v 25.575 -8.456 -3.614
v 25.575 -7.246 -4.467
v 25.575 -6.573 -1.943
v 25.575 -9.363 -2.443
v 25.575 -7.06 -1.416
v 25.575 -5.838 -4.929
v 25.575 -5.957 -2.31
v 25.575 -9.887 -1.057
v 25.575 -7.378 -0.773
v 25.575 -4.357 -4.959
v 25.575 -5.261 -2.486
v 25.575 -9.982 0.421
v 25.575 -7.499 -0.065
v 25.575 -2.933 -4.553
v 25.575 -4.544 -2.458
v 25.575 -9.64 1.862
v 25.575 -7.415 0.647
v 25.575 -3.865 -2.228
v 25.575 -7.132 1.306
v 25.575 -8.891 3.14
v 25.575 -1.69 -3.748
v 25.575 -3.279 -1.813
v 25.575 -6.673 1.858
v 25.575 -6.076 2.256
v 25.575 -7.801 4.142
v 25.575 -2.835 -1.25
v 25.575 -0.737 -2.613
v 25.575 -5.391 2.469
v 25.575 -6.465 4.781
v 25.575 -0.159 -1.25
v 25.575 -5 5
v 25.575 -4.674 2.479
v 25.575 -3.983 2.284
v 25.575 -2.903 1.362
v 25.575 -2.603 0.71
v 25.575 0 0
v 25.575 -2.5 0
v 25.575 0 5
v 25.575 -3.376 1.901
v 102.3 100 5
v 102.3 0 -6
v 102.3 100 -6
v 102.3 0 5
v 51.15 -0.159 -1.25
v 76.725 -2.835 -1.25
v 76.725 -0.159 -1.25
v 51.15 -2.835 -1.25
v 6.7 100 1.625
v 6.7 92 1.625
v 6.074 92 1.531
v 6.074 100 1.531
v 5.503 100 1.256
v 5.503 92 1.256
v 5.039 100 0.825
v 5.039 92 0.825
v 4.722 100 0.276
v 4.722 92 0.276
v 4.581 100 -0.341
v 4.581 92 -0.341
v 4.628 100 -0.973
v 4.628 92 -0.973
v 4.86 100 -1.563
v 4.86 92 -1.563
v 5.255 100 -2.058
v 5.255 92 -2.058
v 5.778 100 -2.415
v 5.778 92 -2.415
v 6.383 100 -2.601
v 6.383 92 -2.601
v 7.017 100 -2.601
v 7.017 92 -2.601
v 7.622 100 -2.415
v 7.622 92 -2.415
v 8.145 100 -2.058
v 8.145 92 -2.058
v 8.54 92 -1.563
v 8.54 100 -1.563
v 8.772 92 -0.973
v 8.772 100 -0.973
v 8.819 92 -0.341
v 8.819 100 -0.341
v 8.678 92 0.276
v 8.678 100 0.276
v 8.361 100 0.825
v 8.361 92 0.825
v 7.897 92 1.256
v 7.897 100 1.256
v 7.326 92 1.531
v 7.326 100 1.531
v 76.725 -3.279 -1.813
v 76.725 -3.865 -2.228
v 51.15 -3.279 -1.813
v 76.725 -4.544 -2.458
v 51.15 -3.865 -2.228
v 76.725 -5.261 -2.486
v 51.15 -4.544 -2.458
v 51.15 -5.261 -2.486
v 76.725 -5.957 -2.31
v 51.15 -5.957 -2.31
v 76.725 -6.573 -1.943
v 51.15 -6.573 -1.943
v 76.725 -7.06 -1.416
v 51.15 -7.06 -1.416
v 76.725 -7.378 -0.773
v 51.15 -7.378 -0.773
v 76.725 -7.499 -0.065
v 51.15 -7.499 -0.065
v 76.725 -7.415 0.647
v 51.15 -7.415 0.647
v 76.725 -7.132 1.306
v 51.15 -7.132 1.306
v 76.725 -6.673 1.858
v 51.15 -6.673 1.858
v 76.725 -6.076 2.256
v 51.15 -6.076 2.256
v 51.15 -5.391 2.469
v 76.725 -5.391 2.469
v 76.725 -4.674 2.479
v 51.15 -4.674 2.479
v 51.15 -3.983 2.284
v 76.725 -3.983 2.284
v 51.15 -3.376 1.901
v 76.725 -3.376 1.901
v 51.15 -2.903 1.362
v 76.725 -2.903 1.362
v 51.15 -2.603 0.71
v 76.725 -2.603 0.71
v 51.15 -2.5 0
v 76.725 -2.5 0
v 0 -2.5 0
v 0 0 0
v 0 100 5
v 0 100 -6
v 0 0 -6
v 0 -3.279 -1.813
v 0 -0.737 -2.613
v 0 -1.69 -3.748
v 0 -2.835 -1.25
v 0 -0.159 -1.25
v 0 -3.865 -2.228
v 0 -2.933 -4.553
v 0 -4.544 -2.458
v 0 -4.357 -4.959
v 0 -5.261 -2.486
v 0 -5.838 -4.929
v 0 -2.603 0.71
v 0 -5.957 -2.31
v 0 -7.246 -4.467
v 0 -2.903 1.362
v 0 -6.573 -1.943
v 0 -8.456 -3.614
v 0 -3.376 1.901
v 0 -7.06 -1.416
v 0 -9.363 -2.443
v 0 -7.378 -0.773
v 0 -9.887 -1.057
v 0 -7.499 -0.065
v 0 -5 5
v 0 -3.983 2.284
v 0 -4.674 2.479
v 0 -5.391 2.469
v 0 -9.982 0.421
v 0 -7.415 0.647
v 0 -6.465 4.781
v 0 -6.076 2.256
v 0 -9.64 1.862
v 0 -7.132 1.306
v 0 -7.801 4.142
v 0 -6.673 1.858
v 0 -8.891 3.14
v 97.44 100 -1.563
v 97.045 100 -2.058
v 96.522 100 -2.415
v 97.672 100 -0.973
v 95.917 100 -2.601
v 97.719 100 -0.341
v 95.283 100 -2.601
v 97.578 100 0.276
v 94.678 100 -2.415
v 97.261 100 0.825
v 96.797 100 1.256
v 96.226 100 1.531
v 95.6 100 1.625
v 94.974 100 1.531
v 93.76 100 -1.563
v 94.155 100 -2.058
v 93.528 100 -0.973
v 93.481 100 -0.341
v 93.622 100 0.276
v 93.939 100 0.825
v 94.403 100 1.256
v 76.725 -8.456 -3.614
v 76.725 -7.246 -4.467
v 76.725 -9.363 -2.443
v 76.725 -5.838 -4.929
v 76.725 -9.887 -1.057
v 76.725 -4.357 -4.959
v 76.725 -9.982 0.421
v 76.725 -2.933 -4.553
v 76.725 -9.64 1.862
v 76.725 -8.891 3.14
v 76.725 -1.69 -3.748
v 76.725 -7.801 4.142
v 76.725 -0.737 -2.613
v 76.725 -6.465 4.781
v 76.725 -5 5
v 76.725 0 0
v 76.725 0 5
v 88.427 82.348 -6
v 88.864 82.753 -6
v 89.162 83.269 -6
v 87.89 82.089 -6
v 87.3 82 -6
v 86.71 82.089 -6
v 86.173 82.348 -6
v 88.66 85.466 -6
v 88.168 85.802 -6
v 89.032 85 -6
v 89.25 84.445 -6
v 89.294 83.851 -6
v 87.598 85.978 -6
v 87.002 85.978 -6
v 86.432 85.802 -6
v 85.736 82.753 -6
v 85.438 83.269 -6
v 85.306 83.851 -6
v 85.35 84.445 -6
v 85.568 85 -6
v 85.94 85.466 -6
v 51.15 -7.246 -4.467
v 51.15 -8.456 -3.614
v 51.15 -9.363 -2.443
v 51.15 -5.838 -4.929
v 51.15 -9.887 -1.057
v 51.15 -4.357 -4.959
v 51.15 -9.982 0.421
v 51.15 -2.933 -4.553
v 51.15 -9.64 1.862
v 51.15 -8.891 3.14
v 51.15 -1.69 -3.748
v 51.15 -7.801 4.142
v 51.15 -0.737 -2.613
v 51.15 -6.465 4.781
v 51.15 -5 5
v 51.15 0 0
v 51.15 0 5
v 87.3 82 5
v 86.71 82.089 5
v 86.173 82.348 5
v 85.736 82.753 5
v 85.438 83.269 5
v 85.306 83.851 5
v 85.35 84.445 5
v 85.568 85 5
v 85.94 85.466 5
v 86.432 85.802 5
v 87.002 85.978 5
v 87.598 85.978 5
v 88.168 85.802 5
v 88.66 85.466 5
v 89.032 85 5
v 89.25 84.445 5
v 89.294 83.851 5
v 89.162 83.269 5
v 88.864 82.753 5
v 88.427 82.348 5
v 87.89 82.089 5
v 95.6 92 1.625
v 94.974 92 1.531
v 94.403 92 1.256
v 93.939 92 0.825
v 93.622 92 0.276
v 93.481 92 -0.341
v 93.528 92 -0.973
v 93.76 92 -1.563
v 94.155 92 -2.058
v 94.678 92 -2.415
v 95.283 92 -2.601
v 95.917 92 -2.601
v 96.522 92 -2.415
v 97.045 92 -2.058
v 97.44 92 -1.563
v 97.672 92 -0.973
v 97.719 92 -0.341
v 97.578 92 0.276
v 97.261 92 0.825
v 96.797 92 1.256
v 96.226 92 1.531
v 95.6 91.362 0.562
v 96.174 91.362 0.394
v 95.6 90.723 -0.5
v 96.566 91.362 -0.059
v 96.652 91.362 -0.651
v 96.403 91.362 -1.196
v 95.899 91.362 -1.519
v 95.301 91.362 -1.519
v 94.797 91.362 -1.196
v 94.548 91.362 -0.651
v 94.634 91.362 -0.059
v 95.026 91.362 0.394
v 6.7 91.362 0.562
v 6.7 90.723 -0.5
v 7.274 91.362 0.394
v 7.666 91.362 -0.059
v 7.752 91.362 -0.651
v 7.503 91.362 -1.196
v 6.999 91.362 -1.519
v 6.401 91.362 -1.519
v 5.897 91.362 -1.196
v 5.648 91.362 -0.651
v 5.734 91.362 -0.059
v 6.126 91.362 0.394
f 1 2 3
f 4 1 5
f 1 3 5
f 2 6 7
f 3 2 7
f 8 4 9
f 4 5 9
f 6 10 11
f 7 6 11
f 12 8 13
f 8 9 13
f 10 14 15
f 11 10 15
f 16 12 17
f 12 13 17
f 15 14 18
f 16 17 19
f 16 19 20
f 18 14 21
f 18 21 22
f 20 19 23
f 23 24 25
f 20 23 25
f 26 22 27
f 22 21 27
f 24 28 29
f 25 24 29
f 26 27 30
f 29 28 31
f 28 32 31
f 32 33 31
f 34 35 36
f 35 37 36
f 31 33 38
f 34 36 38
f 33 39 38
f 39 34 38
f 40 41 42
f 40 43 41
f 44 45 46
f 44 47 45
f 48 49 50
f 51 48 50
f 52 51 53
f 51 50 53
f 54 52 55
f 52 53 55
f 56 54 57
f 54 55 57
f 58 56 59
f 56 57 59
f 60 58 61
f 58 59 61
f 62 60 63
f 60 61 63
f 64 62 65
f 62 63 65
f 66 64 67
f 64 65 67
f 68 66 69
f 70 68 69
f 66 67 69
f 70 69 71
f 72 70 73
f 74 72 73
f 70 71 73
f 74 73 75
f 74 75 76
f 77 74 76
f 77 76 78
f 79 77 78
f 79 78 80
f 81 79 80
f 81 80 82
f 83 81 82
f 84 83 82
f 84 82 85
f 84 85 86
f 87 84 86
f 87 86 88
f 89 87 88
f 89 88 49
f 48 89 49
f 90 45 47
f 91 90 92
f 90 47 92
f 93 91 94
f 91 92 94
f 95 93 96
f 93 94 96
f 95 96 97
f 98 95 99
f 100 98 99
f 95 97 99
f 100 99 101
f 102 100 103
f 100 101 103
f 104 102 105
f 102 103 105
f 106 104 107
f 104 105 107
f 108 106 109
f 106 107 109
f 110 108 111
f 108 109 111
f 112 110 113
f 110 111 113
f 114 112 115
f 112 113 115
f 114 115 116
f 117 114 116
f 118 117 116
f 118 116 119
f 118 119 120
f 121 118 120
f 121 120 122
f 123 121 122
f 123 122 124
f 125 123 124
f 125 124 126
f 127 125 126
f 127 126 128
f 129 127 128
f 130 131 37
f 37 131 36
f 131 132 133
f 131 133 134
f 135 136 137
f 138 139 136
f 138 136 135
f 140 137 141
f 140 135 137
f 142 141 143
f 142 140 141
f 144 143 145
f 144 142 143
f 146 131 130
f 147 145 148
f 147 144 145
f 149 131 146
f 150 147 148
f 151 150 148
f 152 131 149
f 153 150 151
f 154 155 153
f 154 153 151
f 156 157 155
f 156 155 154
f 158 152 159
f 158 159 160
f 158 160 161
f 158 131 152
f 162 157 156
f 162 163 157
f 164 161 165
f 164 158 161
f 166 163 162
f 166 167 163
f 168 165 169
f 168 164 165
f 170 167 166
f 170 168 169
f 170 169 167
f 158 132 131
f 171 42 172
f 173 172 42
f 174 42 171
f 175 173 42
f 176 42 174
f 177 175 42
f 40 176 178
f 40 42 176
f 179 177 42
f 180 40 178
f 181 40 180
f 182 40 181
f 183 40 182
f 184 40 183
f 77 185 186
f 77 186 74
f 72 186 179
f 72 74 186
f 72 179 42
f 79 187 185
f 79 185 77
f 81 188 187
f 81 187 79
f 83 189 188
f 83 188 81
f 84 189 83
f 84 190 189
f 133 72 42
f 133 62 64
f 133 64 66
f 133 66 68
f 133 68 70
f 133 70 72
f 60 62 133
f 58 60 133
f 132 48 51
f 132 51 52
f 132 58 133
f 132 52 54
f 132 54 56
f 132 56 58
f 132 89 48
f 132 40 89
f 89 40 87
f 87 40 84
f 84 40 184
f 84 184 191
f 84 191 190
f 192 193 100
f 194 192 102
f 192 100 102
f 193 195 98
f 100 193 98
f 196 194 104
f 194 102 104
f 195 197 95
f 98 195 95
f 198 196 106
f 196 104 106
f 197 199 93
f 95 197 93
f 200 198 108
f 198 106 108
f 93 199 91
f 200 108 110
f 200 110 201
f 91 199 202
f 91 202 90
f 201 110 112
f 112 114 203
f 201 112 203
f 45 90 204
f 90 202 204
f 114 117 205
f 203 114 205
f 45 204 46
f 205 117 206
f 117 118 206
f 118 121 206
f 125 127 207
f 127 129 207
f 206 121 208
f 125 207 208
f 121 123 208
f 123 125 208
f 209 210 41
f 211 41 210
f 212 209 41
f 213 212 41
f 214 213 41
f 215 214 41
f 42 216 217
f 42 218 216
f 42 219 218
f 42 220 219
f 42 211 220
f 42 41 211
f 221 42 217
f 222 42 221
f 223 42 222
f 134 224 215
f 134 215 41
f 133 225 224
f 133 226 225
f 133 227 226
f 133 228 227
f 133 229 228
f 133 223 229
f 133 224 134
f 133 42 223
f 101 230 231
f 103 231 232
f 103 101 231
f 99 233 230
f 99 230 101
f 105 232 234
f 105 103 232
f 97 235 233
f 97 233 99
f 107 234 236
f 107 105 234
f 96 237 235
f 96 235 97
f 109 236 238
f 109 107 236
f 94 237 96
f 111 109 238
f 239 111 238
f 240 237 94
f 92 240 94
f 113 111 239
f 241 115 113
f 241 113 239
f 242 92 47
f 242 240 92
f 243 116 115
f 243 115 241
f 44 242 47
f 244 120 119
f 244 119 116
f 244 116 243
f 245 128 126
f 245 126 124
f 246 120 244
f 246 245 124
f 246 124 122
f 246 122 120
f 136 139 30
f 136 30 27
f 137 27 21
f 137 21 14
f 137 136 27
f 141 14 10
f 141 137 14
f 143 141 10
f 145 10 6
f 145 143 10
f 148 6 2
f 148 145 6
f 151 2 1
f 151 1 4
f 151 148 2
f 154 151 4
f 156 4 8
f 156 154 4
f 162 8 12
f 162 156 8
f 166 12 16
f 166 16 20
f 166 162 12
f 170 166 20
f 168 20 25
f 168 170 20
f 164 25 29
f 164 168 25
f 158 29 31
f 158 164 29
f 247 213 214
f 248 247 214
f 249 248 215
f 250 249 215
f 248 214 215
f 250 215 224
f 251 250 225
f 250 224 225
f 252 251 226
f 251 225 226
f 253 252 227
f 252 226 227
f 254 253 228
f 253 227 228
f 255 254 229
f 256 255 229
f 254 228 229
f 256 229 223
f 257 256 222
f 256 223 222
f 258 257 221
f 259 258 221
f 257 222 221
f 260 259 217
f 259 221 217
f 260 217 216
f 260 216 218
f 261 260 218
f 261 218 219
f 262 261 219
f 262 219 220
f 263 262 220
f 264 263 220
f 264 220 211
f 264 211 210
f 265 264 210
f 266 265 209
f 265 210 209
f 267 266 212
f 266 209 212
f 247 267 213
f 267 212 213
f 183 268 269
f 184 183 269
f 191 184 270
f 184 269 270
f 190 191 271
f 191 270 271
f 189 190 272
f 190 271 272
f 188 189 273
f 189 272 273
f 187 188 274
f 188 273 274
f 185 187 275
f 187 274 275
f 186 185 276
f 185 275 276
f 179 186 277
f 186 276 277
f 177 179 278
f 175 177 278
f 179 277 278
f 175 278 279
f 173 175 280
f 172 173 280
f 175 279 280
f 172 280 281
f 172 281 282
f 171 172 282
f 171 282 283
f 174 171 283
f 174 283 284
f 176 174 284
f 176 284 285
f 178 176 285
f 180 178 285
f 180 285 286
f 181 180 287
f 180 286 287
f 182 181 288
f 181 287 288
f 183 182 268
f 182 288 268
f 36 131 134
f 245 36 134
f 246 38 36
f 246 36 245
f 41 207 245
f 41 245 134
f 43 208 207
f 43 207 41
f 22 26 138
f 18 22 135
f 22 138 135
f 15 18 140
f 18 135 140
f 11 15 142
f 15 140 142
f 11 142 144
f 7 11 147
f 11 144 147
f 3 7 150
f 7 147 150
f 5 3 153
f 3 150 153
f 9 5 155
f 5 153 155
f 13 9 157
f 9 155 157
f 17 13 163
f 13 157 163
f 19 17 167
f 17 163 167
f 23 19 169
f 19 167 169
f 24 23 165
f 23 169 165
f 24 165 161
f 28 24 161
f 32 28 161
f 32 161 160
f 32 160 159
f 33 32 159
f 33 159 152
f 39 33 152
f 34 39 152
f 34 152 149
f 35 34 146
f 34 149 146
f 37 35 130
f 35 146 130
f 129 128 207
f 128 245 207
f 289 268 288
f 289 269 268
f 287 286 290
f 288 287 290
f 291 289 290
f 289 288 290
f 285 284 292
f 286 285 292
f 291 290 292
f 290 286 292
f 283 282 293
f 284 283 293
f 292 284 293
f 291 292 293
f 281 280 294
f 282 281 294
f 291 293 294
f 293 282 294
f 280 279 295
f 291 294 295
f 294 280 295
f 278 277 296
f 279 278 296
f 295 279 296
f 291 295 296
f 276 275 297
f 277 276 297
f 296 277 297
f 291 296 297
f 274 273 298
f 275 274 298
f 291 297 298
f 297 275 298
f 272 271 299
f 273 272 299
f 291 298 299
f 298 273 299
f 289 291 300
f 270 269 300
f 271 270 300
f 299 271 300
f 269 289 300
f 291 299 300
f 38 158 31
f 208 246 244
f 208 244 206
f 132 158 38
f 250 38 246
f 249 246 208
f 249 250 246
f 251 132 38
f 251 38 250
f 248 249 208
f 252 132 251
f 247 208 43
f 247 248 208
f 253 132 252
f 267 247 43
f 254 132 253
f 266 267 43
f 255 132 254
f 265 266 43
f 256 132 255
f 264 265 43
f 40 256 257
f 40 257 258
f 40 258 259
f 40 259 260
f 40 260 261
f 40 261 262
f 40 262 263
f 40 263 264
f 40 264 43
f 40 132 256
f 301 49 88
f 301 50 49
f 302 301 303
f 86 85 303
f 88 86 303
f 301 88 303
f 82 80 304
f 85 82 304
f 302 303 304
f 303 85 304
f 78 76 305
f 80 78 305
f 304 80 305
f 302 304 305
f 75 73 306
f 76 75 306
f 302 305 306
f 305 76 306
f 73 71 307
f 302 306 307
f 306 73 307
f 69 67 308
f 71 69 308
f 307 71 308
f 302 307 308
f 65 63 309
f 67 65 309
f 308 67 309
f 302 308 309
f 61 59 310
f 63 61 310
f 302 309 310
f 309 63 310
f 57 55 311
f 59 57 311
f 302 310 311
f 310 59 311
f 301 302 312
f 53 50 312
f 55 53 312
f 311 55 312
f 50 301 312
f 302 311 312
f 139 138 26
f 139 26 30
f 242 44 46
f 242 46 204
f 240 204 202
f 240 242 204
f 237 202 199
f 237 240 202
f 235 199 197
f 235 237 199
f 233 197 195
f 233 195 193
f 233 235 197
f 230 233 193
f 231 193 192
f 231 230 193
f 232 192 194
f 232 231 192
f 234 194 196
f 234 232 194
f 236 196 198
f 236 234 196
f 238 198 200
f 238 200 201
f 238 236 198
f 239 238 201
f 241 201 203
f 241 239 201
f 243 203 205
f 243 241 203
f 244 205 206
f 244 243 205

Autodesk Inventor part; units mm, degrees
ref_plane "YZ Plane" through (0, 0, 0) normal (1, 0, 0) x (0, 1, 0)
ref_plane "XZ Plane" through (0, 0, 0) normal (0, 1, 0) x (-1, 0, 0)
ref_plane "XY Plane" through (0, 0, 0) normal (0, 0, 1) x (1, 0, 0)
sketch "Sketch1" plane through (0, 0, 0) normal (0, 0, 1) x (1, 0, 0)
  line L0 (0, 0) -> (102.3, 0)
  line L1 (102.3, 0) -> (102.3, 100)
  line L2 (102.3, 100) -> (0, 100)
  line L3 (0, 100) -> (0, 0)
  dimension "d0" = 102.3
  dimension "d1" = 100
extrude "Extrusion1" add sketch "Sketch1" along normal blind 5
sketch "Sketch3" plane through (0, 0, 0) normal (-1, 0, 0) x (0, 0, 1)
  line L0 (5, 0) -> (0, 0)
  line L1 (0, 0) -> (0, -5)
  line L2 (0, -5) -> (5, -5)
  line L3 (5, -5) -> (5, 0)
  circle A0 centre (0, -5) radius 5
  circle A1 centre (0, -5) radius 2.5
  line L4 (-1.25, -2.8349) -> (-1.25, -0.1588)
  point P0 (0, 0)
  point P1 (0, -2.5)
  dimension "d15" = 5
  dimension "d16" = 5
  dimension "d17" = 5
  dimension "d18" = 2.5
  dimension "d19" = 1.25
extrude "Extrusion3" add sketch "Sketch3" against normal blind 25.575 contours L3 A0 L0 | A0 L2 A1 L1 | A0 L4 A1 L2
pattern_linear "Rectangular Pattern2" count 2 spacing 51.15 along (1, 0, 0) of "Extrusion3"
sketch "Sketch4" plane through (0, 0, 0) normal (0, 0, -1) x (-1, 0, 0)
  point P0 (0, 0)
sketch "Sketch5" plane through (0, 0, 0) normal (0, 0, -1) x (-1, 0, 0)
  line L0 (-102.3, 0) -> (-102.3, 100) projected
  line L1 (0, 0) -> (-102.3, 0)
  line L2 (-102.3, 0) -> (-102.3, 100)
  line L3 (-102.3, 100) -> (0, 100)
  line L4 (0, 100) -> (0, 0)
extrude "Extrusion4" add sketch "Sketch5" along normal blind 6
sketch "Sketch6" plane through (0, 0, 5) normal (0, 0, 1) x (1, 0, 0)
  line L0 (102.3, 100) -> (0, 100) construction
  line L1 (87.3, 100) -> (87.3, 84) construction
  line L2 (102.3, 0) -> (102.3, 100) construction
  point P0 (0, 0)
  dimension "d27" = 15
  dimension "d28" = 16
hole "Hole1" at (87.3, 84, 5) direction (0, 0, -1) diameter 4 end through all
sketch "Sketch8" plane through (51.15, -5, 5) normal (-1, 0, 0) x (0, 0, 1)
  point P0 (-5, 5)
sketch "Sketch9" plane through (0, 0, 5) normal (0, 0, 1) x (1, 0, 0)
  circle A0 centre (87.3, 84) radius 2 construction
  line L0 (87.3, 84) -> (102.3, 84) construction
  line L1 (102.3, 0) -> (102.3, 100) construction
  line L2 (87.3, 84) -> (87.3, 100) construction
  line L3 (76.725, 0) -> (102.3, 0) projected
  line L4 (102.3, 100) -> (0, 100) projected
  point P0 (0, 0)
  dimension "d45" = 15
  dimension "d46" = 16
  dimension "d57" = 100
sketch "Sketch10" plane through (0, 100, 5) normal (0, 1, 0) x (1, 0, 0)
  line L0 (0, 10) -> (0, 0) construction
  line L1 (0, 5.5) -> (102.7523, 5.5) construction
  line L2 (0, 11) -> (102.3, 11) construction
  point P0 (95.6, 5.5)
  point P1 (6.7, 5.5)
  point P2 (0, 6.25)
  dimension "d47" = 88.9
  dimension "d48" = 5.5
  dimension "d49" = 6.7
hole "Hole3" at (6.7, 100, -0.5) at (95.6, 100, -0.5) direction (0, -1, 0) diameter 4.25 depth 8 tip angle 118
properties part number "Hinge2"
